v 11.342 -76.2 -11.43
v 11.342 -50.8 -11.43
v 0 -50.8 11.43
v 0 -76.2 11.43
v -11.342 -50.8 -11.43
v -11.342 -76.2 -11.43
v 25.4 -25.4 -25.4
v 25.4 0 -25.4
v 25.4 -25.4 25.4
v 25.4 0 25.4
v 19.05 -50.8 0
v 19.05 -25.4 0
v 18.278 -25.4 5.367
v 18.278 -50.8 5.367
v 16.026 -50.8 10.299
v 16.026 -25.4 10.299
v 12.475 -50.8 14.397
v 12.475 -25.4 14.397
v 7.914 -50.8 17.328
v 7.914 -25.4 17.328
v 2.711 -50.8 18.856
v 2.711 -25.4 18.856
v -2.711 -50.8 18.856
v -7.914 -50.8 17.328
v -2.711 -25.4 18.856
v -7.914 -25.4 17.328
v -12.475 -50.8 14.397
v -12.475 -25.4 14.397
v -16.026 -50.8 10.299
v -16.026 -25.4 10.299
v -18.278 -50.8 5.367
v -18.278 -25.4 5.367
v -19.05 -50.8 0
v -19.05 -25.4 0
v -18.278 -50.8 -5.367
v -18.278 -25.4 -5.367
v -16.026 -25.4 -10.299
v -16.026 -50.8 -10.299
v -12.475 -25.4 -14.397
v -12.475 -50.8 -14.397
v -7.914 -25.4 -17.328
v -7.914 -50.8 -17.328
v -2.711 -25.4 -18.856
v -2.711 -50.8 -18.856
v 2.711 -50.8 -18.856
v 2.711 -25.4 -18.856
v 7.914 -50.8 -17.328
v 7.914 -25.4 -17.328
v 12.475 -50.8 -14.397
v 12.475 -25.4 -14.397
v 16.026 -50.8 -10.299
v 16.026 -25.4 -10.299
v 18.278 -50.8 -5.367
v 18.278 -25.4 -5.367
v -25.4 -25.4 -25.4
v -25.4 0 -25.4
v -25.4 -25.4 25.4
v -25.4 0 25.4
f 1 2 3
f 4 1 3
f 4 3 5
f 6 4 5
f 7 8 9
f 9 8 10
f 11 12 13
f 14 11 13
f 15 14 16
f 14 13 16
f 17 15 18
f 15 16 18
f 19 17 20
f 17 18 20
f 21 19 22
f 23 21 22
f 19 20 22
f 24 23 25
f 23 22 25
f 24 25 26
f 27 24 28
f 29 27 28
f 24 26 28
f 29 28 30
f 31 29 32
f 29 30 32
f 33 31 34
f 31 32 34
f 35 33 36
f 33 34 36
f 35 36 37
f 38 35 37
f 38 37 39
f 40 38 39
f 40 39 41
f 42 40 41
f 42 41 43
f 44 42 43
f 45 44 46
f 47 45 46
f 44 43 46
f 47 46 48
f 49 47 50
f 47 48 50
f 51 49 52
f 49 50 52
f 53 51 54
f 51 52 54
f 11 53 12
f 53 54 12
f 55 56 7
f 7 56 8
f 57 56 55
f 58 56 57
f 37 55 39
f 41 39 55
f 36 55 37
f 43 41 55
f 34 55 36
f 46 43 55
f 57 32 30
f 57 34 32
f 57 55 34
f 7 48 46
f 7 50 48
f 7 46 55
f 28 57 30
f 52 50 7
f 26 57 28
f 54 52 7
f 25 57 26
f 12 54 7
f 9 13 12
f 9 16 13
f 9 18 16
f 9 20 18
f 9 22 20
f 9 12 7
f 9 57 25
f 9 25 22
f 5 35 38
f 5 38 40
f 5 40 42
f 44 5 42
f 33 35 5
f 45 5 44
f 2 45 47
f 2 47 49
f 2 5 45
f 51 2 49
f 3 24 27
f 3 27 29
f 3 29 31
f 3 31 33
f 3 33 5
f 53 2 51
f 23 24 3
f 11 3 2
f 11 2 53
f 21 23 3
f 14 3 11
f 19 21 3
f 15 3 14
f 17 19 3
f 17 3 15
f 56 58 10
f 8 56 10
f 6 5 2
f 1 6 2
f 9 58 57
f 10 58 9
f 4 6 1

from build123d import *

# Parameters (mm, degrees)
F0_W     = 50.8
F0_H     = 50.8
F1_DEPTH = 25.4
F2_R     = 19.05
F3_DEPTH = 25.4
F5_DEPTH = 25.4


with BuildPart() as f1:
    # F0 (on Front) → F1 (new body)
    with BuildSketch(Plane.XZ):
        Rectangle(F0_W, F0_H)
    extrude(amount=F1_DEPTH)

    # F2 (on face) → F3 (join)
    with BuildSketch(Plane.XZ.offset(25.4)):
        Circle(F2_R)
    extrude(amount=F3_DEPTH)

    # F4 (on face) → F5 (join)
    with BuildSketch(Plane.XZ.offset(50.8)):
        Polygon((11.341736, -11.43), (0, 11.43), (-11.341736, -11.43), align=None)
    extrude(amount=F5_DEPTH)


solid = f1.part
